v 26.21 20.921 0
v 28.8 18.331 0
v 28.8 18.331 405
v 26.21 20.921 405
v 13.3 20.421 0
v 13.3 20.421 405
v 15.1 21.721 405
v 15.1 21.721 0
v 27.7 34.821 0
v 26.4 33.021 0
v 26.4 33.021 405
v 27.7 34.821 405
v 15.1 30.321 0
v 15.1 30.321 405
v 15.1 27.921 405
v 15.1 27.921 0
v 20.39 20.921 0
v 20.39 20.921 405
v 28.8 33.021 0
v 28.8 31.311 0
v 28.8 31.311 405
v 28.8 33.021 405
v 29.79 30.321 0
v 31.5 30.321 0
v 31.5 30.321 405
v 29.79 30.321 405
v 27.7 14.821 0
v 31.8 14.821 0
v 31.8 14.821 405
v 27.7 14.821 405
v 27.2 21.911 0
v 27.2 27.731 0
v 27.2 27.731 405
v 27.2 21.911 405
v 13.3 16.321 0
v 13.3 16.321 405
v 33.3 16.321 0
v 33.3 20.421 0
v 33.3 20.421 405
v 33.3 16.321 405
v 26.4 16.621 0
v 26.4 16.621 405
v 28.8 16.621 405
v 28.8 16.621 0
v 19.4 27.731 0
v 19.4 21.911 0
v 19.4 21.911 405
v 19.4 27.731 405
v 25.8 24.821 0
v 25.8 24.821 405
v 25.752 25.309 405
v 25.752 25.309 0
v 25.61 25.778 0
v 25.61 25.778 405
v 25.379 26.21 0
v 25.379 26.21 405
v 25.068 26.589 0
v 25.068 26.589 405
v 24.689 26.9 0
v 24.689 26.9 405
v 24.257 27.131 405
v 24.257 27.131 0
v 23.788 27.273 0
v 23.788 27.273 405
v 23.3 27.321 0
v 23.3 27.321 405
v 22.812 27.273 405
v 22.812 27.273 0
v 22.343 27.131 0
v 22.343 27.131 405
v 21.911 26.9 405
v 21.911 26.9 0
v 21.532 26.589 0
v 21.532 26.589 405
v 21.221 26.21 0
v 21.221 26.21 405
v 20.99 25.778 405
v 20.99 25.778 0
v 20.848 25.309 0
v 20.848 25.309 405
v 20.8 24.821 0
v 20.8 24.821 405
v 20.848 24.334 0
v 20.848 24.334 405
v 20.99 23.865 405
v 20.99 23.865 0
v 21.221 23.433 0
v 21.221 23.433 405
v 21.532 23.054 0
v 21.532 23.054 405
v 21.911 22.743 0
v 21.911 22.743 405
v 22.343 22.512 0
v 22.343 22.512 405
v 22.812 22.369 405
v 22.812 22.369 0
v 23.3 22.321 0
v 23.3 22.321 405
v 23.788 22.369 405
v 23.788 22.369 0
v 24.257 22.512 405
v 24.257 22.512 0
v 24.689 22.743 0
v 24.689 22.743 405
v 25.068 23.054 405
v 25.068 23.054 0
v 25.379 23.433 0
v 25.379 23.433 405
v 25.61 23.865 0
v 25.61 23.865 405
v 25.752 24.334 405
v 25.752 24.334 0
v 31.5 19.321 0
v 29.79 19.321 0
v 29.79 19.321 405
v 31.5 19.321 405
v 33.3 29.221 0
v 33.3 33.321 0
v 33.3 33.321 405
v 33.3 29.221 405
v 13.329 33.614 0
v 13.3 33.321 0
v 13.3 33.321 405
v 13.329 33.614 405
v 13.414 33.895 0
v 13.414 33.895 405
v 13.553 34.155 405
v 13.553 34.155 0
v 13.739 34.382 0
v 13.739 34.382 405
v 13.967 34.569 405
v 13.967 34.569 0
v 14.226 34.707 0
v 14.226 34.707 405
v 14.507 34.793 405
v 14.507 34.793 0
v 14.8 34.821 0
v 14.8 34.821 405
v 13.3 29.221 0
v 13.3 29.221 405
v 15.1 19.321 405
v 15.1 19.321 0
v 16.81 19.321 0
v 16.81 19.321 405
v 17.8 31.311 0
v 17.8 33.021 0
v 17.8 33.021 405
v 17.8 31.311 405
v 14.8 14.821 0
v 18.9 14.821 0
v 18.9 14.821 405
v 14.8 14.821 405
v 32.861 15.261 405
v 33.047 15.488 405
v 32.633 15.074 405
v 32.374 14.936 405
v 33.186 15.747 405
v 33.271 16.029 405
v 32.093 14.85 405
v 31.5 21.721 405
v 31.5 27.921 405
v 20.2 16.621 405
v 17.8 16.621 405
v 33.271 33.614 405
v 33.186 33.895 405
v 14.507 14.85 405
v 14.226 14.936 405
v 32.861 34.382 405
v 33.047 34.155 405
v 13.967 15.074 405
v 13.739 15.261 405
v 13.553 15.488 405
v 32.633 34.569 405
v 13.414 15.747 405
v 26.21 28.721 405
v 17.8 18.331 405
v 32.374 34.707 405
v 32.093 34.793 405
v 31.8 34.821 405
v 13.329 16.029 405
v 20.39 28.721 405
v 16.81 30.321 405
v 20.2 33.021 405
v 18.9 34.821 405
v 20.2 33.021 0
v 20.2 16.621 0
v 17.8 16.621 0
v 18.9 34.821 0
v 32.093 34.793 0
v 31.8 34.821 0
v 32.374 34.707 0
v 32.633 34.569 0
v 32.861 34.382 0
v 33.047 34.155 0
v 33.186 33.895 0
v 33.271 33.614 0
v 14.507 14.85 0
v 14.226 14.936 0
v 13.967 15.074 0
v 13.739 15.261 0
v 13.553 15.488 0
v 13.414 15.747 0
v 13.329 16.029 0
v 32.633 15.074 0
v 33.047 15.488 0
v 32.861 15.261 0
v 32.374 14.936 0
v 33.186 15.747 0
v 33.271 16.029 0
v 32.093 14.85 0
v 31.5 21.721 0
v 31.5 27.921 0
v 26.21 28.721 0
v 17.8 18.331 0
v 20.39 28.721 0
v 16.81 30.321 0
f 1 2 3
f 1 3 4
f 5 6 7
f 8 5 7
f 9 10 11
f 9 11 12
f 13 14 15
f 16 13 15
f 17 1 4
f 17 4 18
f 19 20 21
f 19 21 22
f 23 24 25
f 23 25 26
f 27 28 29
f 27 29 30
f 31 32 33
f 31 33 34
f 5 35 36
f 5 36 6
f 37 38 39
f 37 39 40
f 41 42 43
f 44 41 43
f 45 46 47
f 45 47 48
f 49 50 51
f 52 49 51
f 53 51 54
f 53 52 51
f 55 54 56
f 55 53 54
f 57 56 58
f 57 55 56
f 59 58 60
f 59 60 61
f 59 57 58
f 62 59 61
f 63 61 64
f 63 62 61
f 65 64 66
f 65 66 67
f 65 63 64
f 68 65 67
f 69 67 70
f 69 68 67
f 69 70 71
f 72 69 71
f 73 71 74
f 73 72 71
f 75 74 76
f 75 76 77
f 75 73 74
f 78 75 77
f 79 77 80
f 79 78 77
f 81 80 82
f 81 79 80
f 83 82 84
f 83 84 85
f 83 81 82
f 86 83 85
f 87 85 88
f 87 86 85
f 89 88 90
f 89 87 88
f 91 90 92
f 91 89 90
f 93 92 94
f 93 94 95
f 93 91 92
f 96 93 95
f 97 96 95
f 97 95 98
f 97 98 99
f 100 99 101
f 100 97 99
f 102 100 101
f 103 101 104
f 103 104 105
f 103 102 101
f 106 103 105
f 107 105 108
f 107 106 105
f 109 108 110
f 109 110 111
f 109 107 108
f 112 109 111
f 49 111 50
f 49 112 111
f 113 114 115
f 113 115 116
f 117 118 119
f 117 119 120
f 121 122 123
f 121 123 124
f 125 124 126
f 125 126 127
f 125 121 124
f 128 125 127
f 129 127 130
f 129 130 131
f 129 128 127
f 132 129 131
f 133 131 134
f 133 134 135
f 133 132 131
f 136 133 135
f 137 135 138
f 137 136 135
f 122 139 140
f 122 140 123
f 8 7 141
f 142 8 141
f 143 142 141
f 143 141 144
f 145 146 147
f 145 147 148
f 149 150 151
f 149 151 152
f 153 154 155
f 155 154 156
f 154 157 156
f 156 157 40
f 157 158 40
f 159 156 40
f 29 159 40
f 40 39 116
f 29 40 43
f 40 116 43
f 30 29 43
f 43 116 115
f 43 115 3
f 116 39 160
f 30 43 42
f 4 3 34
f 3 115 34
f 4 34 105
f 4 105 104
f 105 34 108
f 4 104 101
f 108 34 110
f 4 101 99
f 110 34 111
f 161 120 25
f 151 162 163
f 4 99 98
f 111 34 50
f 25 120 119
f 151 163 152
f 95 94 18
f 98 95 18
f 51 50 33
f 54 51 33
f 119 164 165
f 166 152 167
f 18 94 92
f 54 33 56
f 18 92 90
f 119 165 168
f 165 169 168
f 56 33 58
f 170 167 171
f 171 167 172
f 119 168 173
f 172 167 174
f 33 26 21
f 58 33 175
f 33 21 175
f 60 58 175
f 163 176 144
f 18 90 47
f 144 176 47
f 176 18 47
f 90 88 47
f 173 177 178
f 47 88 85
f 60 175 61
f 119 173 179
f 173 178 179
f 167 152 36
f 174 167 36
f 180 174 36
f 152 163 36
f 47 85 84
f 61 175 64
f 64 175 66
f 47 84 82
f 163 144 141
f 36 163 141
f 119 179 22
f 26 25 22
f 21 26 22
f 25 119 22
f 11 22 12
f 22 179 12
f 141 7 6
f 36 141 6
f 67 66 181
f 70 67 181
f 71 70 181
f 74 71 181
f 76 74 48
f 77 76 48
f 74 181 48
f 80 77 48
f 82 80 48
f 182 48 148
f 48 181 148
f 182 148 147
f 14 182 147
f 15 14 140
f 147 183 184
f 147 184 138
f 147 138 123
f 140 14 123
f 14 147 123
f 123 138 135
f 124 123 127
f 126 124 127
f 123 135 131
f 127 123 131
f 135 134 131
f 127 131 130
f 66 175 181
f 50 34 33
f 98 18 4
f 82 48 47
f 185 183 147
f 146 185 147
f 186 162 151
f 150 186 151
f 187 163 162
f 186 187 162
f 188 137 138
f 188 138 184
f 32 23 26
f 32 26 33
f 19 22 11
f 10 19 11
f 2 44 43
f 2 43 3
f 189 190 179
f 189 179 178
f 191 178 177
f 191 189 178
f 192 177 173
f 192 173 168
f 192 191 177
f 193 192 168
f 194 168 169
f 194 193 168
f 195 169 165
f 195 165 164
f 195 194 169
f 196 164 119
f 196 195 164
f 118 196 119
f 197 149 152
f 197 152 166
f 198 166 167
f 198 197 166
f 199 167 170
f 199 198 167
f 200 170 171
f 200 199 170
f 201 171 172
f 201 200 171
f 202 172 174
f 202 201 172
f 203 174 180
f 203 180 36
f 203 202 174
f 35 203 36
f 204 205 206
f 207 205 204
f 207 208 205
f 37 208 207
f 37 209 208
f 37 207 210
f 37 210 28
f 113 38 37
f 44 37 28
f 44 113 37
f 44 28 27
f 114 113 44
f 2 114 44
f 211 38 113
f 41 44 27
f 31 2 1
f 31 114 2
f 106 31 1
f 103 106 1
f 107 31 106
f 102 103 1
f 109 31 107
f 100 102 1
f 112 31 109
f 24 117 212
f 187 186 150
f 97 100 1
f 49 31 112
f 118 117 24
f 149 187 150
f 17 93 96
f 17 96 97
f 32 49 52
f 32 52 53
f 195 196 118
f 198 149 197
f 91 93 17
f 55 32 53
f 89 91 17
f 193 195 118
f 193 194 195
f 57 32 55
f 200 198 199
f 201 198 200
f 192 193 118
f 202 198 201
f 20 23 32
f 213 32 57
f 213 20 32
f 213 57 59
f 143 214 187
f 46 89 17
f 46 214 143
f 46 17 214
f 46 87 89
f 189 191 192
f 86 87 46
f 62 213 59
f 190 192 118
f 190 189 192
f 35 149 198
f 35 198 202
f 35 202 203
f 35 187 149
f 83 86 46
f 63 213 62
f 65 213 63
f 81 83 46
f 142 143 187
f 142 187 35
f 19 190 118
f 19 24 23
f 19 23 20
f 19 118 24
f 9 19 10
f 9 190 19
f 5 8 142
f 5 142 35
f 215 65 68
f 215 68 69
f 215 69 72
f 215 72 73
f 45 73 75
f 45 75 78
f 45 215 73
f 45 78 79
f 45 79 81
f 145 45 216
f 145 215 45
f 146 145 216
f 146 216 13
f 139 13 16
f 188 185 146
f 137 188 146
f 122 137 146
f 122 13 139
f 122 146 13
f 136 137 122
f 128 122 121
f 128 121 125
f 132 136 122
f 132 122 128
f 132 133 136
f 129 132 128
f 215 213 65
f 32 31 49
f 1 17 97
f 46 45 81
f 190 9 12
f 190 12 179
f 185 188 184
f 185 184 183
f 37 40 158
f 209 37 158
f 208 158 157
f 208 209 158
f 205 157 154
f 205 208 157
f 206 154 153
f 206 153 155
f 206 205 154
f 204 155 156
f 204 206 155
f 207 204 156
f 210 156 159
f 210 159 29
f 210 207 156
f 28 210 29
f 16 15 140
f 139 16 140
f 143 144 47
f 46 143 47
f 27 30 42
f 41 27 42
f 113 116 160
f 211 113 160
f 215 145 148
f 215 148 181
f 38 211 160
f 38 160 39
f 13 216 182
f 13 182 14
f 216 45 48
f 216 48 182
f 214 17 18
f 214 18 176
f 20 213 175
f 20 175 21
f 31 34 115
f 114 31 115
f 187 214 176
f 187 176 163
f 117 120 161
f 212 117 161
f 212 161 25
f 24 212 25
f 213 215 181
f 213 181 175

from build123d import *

# Parameters (mm, degrees)
SKETCH_1_R      = 2.5
EXTRUDE_1_DEPTH = 405


with BuildPart() as part:
    # 草图1 → 凸台-拉伸1 (new body)
    with BuildSketch(Plane.XY):
        with BuildLine():
            Line((14.8, 34.821428571), (18.9, 34.821428571))
            Line((18.9, 34.821428571), (20.2, 33.021428571))
            Line((20.2, 33.021428571), (17.8, 33.021428571))
            Line((17.8, 33.021428571), (17.8, 31.311378065))
            Line((17.8, 31.311378065), (20.389949494, 28.721428571))
            Line((20.389949494, 28.721428571), (26.210050506, 28.721428571))
            Line((26.210050506, 28.721428571), (28.8, 31.311378065))
            Line((28.8, 31.311378065), (28.8, 33.021428571))
            Line((28.8, 33.021428571), (26.4, 33.021428571))
            Line((26.4, 33.021428571), (27.7, 34.821428571))
            Line((27.7, 34.821428571), (31.8, 34.821428571))
            ThreePointArc((31.8, 34.821428571), (32.860660172, 34.382088743), (33.3, 33.321428571))
            Line((33.3, 33.321428571), (33.3, 29.221428571))
            Line((33.3, 29.221428571), (31.5, 27.921428571))
            Line((31.5, 27.921428571), (31.5, 30.321428571))
            Line((31.5, 30.321428571), (29.789949494, 30.321428571))
            Line((29.789949494, 30.321428571), (27.2, 27.731479078))
            Line((27.2, 27.731479078), (27.2, 21.911378065))
            Line((27.2, 21.911378065), (29.789949494, 19.321428571))
            Line((29.789949494, 19.321428571), (31.5, 19.321428571))
            Line((31.5, 19.321428571), (31.5, 21.721428571))
            Line((31.5, 21.721428571), (33.3, 20.421428571))
            Line((33.3, 20.421428571), (33.3, 16.321428571))
            ThreePointArc((33.3, 16.321428571), (32.860660172, 15.2607684), (31.8, 14.821428571))
            Line((31.8, 14.821428571), (27.7, 14.821428571))
            Line((27.7, 14.821428571), (26.4, 16.621428571))
            Line((26.4, 16.621428571), (28.8, 16.621428571))
            Line((28.8, 16.621428571), (28.8, 18.331479078))
            Line((28.8, 18.331479078), (26.210050506, 20.921428571))
            Line((26.210050506, 20.921428571), (20.389949494, 20.921428571))
            Line((20.389949494, 20.921428571), (17.8, 18.331479078))
            Line((17.8, 18.331479078), (17.8, 16.621428571))
            Line((17.8, 16.621428571), (20.2, 16.621428571))
            Line((20.2, 16.621428571), (18.9, 14.821428571))
            Line((18.9, 14.821428571), (14.8, 14.821428571))
            ThreePointArc((14.8, 14.821428571), (13.739339828, 15.2607684), (13.3, 16.321428571))
            Line((13.3, 16.321428571), (13.3, 20.421428571))
            Line((13.3, 20.421428571), (15.1, 21.721428571))
            Line((15.1, 21.721428571), (15.1, 19.321428571))
            Line((15.1, 19.321428571), (16.810050506, 19.321428571))
            Line((16.810050506, 19.321428571), (19.4, 21.911378065))
            Line((19.4, 21.911378065), (19.4, 27.731479078))
            Line((19.4, 27.731479078), (16.810050506, 30.321428571))
            Line((16.810050506, 30.321428571), (15.1, 30.321428571))
            Line((15.1, 30.321428571), (15.1, 27.921428571))
            Line((15.1, 27.921428571), (13.3, 29.221428571))
            Line((13.3, 29.221428571), (13.3, 33.321428571))
            ThreePointArc((13.3, 33.321428571), (13.739339828, 34.382088743), (14.8, 34.821428571))
        make_face()
        with Locations((23.3, 24.821428571)):
            Circle(SKETCH_1_R, mode=Mode.SUBTRACT)
    extrude(amount=EXTRUDE_1_DEPTH)


solid = part.part
